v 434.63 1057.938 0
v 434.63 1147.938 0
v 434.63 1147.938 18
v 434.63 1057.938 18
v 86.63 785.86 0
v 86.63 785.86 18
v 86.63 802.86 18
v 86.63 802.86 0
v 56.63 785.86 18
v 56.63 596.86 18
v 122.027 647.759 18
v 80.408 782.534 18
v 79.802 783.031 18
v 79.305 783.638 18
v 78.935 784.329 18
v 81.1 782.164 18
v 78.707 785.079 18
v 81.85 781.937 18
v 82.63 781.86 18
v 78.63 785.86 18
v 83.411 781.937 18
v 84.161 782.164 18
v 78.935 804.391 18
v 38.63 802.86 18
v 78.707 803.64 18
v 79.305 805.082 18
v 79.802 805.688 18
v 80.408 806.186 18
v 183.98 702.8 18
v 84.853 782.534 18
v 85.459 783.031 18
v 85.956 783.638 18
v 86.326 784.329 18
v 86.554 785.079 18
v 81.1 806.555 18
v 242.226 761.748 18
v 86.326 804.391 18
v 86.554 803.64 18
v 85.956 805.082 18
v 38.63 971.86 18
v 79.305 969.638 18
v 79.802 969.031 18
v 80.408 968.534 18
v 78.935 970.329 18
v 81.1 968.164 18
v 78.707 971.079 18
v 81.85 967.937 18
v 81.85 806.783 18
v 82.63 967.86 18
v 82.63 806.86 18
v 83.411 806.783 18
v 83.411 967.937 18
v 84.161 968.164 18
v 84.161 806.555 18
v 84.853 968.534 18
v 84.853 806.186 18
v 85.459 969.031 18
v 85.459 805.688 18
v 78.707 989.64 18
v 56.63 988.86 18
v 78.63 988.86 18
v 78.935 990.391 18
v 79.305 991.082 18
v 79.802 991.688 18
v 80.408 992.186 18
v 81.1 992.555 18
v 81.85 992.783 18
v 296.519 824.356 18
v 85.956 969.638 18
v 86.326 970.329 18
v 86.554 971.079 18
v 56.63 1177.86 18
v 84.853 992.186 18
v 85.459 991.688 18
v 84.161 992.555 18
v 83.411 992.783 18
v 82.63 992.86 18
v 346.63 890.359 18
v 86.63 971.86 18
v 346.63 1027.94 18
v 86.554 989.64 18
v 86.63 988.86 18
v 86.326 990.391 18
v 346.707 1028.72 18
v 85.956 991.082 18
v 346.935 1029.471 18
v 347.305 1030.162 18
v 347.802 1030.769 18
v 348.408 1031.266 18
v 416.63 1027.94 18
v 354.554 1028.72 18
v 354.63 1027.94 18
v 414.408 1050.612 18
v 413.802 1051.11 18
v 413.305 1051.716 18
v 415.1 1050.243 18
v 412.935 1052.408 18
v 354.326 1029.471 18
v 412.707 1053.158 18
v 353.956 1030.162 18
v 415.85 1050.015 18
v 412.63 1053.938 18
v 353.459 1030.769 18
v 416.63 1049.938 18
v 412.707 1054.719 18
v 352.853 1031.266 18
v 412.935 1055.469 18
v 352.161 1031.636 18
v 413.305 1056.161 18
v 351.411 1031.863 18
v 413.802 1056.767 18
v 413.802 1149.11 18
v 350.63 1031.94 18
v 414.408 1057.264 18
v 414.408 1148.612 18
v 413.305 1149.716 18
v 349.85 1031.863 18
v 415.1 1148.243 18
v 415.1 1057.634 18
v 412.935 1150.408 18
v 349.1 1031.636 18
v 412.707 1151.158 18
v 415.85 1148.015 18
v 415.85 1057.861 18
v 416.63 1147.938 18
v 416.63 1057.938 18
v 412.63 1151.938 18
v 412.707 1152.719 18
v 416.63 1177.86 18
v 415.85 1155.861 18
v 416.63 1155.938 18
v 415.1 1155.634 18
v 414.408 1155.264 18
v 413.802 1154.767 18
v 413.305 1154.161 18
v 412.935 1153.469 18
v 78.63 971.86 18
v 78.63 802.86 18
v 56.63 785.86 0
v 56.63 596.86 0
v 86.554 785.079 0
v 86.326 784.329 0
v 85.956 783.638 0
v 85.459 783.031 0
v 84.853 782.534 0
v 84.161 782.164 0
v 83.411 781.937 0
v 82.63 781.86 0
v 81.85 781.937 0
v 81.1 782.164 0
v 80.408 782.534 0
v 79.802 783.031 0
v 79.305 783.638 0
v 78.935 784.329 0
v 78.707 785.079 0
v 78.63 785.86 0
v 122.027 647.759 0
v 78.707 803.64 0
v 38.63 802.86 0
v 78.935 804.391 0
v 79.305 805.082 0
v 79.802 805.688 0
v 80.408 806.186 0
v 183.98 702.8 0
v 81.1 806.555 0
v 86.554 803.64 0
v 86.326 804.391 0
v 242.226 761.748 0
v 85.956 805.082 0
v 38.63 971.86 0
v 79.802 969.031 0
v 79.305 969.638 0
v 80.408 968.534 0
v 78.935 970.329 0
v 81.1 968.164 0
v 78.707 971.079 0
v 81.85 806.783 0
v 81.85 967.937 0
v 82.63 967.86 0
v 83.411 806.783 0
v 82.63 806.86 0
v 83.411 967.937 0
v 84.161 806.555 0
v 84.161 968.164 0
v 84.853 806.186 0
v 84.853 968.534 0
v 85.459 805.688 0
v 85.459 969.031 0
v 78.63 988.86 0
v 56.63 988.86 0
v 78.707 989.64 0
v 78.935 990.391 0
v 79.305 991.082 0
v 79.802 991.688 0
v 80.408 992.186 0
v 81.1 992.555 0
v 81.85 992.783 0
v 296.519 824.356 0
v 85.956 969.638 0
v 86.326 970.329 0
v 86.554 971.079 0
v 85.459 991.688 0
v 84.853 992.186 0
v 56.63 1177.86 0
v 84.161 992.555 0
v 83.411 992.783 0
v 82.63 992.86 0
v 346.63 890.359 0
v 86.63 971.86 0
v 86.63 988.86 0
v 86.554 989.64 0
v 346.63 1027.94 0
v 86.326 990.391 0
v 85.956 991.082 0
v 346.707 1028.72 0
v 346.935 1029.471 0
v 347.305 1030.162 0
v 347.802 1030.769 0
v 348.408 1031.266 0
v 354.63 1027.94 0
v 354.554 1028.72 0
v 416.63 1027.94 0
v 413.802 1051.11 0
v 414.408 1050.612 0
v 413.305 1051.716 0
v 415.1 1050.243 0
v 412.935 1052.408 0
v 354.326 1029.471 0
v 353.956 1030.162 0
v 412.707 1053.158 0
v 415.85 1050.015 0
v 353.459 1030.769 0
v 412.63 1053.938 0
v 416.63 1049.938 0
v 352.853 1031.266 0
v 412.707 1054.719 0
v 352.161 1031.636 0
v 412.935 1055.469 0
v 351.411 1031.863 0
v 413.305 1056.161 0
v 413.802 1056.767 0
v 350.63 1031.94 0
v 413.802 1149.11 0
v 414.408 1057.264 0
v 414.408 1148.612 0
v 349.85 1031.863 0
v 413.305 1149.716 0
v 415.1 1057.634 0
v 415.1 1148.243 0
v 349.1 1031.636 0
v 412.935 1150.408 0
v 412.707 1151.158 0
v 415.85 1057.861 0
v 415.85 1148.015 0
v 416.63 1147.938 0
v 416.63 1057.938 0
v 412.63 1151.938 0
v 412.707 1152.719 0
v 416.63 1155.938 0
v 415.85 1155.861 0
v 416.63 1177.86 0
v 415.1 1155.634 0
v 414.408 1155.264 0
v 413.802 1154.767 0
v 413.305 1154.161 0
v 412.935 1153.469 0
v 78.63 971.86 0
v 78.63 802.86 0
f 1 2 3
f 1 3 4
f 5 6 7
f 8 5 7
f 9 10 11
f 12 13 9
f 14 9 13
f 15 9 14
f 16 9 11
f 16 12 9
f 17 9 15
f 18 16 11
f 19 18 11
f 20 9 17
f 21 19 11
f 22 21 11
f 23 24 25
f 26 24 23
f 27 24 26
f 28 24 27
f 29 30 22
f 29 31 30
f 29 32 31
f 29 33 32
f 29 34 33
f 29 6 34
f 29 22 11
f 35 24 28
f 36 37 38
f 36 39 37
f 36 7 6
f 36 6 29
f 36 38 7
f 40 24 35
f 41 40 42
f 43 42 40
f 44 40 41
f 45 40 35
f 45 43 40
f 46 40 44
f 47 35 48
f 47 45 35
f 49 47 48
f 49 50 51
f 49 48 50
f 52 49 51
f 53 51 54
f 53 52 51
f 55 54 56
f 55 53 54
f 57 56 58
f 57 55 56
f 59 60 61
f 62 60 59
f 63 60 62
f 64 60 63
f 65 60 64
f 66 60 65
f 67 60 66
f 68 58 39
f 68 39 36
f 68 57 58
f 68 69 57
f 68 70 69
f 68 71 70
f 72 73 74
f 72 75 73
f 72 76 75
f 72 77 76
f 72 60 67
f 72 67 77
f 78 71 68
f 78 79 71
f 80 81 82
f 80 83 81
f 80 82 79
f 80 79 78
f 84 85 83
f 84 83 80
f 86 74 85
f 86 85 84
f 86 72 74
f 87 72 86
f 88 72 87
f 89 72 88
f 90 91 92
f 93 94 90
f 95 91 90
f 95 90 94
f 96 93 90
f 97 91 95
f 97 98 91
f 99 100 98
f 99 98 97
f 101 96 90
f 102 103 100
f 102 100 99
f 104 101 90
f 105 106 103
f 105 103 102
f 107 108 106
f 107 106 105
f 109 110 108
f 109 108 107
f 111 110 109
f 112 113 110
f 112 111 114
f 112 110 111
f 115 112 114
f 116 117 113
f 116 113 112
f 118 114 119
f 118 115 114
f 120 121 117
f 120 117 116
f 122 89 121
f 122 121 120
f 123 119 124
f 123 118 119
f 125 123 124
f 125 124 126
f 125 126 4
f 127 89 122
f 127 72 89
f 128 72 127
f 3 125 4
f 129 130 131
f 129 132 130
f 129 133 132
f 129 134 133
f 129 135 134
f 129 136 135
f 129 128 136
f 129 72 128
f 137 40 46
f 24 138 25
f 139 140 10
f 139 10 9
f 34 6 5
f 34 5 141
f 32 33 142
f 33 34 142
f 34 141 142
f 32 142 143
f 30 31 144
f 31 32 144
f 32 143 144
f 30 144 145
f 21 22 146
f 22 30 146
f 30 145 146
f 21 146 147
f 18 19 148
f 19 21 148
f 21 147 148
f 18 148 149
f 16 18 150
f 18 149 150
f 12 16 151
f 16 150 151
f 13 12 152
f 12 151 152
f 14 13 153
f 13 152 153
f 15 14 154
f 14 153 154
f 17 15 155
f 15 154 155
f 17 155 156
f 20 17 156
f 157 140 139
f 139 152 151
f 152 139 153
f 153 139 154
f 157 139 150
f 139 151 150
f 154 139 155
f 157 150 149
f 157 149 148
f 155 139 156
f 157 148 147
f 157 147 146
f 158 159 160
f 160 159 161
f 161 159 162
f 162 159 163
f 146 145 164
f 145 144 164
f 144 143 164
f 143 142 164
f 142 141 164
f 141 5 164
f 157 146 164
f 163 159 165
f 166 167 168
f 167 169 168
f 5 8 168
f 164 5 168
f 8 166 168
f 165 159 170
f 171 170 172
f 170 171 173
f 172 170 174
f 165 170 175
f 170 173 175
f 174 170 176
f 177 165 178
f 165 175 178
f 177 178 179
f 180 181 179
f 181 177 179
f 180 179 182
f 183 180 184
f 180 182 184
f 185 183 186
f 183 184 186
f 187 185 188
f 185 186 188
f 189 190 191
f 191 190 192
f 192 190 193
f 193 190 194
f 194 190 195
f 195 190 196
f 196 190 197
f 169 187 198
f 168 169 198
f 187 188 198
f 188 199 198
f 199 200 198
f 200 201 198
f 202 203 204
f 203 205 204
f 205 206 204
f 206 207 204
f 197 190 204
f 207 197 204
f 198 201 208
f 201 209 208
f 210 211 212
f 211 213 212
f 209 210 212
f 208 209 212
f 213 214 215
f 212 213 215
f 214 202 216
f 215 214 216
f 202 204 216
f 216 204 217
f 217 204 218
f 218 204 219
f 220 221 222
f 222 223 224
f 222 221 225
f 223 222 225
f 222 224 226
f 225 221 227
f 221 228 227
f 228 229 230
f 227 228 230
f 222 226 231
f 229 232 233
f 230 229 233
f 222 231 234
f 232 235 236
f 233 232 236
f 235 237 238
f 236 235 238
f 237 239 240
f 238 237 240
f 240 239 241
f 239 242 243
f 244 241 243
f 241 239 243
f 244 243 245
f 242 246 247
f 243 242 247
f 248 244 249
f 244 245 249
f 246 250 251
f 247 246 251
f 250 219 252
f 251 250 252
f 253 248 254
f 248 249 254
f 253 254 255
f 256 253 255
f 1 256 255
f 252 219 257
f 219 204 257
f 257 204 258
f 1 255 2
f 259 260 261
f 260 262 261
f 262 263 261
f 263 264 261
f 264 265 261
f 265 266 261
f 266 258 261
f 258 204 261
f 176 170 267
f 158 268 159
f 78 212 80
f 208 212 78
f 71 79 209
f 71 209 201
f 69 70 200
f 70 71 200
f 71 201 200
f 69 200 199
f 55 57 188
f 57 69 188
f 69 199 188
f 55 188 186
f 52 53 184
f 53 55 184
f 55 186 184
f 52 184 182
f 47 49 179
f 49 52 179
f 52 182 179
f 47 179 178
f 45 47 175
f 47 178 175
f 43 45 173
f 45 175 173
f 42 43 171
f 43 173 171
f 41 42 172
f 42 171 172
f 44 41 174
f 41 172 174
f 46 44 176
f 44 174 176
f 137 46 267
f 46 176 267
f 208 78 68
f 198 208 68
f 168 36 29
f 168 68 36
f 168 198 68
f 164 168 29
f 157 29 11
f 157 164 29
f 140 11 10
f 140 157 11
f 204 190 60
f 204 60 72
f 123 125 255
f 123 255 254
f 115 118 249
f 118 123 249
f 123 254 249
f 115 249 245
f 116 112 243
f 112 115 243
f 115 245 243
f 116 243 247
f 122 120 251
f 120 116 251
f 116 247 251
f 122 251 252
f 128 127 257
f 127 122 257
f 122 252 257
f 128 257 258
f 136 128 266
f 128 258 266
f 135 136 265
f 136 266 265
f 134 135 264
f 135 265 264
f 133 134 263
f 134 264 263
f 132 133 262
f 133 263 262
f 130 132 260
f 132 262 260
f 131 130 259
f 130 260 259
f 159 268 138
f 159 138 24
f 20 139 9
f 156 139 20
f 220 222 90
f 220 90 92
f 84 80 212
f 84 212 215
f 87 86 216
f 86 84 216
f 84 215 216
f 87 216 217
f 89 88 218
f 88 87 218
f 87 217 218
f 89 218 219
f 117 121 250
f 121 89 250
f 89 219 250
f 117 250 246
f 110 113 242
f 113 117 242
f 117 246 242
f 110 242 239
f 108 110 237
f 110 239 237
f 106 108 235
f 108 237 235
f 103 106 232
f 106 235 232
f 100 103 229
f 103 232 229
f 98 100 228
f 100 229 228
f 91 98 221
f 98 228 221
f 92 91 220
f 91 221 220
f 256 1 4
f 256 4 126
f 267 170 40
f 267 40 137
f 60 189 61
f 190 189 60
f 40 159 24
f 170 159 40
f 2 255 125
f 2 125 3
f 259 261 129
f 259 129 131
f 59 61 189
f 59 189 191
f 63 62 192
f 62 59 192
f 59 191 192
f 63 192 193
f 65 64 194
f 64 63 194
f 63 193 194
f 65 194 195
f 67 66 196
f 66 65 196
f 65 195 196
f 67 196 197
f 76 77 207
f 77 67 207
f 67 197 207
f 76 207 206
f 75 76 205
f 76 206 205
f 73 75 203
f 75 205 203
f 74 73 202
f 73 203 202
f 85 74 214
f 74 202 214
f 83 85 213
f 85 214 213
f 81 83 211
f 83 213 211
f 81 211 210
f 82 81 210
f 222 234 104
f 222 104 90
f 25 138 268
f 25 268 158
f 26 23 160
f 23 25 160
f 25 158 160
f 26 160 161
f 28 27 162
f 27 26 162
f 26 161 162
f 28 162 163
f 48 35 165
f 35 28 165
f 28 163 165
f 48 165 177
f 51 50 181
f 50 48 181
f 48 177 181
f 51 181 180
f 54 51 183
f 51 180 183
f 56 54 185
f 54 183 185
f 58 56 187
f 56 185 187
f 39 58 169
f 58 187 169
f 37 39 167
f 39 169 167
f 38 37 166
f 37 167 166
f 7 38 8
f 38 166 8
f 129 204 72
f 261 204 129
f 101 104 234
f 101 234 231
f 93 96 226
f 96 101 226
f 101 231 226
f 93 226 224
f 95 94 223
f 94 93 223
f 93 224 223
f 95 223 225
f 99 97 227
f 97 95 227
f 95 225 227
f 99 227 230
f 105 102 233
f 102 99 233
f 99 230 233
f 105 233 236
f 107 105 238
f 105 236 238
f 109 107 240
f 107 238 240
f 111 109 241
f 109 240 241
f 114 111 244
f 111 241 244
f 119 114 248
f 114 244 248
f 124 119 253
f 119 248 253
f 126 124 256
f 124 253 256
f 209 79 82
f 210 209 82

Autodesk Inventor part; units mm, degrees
ref_plane "YZ Plane" through (0, 0, 0) normal (1, 0, 0) x (0, 1, 0)
ref_plane "XZ Plane" through (0, 0, 0) normal (0, 1, 0) x (-1, 0, 0)
ref_plane "XY Plane" through (0, 0, 0) normal (0, 0, 1) x (1, 0, 0)
sketch "CONTOURS" plane through (0, 0, 0) normal (0, 0, 1) x (1, 0, 0)
  arc A0 (354.6305, 1027.9401) -> (346.6305, 1027.9401) centre (350.6305, 1027.9401) ccw
  line L0 (346.6305, 1027.9401) -> (346.6305, 890.3591)
  arc A1 (56.6305, 596.8599) -> (346.6305, 890.3591) centre (-693.3695, 1627.9389) ccw
  line L1 (56.6305, 596.8599) -> (56.6305, 785.8598)
  line L2 (56.6305, 785.8598) -> (78.6305, 785.8598)
  arc A2 (78.6305, 785.8598) -> (86.6305, 785.8598) centre (82.6305, 785.8598) ccw
  line L3 (86.6305, 785.8598) -> (86.6305, 802.8598)
  arc A3 (86.6305, 802.8598) -> (78.6305, 802.8598) centre (82.6305, 802.8598) ccw
  line L4 (78.6305, 802.8598) -> (38.6305, 802.8598)
  line L5 (38.6305, 802.8598) -> (38.6305, 971.8598)
  line L6 (38.6305, 971.8598) -> (78.6305, 971.8598)
  arc A4 (78.6305, 971.8598) -> (86.6305, 971.8598) centre (82.6305, 971.8598) ccw
  line L7 (86.6305, 971.8598) -> (86.6305, 988.8598)
  arc A5 (86.6305, 988.8598) -> (78.6305, 988.8598) centre (82.6305, 988.8598) ccw
  line L8 (78.6305, 988.8598) -> (56.6305, 988.8598)
  line L9 (56.6305, 988.8598) -> (56.6305, 1177.8597)
  line L10 (56.6305, 1177.8597) -> (416.6305, 1177.8597)
  line L11 (416.6305, 1177.8597) -> (416.6305, 1155.9383)
  arc A6 (416.6305, 1155.9383) -> (416.6305, 1147.9383) centre (416.6305, 1151.9383) ccw
  line L12 (416.6305, 1147.9383) -> (434.6305, 1147.9383)
  line L13 (434.6305, 1147.9383) -> (434.6305, 1057.9383)
  line L14 (434.6305, 1057.9383) -> (416.6305, 1057.9383)
  arc A7 (416.6305, 1057.9383) -> (416.6305, 1049.9383) centre (416.6305, 1053.9383) ccw
  line L15 (416.6305, 1049.9383) -> (416.6305, 1027.9401)
  line L16 (416.6305, 1027.9401) -> (354.6305, 1027.9401)
sketch "LETTERS" plane through (0, 0, 0) normal (0, 0, 1) x (1, 0, 0)
  line L0 (214.8818, 1093.6309) -> (234.6305, 1102.9383)
  line L1 (234.6305, 1084.5494) -> (214.8818, 1093.6309)
  line L2 (214.8058, 1113.3691) -> (234.6305, 1113.3691)
  line L3 (217.3755, 1109.636) -> (214.8058, 1113.3691)
  line L4 (226.7124, 1099.1165) -> (226.7124, 1088.2213)
extrude "Extrusion1" add sketch "CONTOURS" along normal blind 18
properties part number "Support A1" material "Wood (Birch)"
